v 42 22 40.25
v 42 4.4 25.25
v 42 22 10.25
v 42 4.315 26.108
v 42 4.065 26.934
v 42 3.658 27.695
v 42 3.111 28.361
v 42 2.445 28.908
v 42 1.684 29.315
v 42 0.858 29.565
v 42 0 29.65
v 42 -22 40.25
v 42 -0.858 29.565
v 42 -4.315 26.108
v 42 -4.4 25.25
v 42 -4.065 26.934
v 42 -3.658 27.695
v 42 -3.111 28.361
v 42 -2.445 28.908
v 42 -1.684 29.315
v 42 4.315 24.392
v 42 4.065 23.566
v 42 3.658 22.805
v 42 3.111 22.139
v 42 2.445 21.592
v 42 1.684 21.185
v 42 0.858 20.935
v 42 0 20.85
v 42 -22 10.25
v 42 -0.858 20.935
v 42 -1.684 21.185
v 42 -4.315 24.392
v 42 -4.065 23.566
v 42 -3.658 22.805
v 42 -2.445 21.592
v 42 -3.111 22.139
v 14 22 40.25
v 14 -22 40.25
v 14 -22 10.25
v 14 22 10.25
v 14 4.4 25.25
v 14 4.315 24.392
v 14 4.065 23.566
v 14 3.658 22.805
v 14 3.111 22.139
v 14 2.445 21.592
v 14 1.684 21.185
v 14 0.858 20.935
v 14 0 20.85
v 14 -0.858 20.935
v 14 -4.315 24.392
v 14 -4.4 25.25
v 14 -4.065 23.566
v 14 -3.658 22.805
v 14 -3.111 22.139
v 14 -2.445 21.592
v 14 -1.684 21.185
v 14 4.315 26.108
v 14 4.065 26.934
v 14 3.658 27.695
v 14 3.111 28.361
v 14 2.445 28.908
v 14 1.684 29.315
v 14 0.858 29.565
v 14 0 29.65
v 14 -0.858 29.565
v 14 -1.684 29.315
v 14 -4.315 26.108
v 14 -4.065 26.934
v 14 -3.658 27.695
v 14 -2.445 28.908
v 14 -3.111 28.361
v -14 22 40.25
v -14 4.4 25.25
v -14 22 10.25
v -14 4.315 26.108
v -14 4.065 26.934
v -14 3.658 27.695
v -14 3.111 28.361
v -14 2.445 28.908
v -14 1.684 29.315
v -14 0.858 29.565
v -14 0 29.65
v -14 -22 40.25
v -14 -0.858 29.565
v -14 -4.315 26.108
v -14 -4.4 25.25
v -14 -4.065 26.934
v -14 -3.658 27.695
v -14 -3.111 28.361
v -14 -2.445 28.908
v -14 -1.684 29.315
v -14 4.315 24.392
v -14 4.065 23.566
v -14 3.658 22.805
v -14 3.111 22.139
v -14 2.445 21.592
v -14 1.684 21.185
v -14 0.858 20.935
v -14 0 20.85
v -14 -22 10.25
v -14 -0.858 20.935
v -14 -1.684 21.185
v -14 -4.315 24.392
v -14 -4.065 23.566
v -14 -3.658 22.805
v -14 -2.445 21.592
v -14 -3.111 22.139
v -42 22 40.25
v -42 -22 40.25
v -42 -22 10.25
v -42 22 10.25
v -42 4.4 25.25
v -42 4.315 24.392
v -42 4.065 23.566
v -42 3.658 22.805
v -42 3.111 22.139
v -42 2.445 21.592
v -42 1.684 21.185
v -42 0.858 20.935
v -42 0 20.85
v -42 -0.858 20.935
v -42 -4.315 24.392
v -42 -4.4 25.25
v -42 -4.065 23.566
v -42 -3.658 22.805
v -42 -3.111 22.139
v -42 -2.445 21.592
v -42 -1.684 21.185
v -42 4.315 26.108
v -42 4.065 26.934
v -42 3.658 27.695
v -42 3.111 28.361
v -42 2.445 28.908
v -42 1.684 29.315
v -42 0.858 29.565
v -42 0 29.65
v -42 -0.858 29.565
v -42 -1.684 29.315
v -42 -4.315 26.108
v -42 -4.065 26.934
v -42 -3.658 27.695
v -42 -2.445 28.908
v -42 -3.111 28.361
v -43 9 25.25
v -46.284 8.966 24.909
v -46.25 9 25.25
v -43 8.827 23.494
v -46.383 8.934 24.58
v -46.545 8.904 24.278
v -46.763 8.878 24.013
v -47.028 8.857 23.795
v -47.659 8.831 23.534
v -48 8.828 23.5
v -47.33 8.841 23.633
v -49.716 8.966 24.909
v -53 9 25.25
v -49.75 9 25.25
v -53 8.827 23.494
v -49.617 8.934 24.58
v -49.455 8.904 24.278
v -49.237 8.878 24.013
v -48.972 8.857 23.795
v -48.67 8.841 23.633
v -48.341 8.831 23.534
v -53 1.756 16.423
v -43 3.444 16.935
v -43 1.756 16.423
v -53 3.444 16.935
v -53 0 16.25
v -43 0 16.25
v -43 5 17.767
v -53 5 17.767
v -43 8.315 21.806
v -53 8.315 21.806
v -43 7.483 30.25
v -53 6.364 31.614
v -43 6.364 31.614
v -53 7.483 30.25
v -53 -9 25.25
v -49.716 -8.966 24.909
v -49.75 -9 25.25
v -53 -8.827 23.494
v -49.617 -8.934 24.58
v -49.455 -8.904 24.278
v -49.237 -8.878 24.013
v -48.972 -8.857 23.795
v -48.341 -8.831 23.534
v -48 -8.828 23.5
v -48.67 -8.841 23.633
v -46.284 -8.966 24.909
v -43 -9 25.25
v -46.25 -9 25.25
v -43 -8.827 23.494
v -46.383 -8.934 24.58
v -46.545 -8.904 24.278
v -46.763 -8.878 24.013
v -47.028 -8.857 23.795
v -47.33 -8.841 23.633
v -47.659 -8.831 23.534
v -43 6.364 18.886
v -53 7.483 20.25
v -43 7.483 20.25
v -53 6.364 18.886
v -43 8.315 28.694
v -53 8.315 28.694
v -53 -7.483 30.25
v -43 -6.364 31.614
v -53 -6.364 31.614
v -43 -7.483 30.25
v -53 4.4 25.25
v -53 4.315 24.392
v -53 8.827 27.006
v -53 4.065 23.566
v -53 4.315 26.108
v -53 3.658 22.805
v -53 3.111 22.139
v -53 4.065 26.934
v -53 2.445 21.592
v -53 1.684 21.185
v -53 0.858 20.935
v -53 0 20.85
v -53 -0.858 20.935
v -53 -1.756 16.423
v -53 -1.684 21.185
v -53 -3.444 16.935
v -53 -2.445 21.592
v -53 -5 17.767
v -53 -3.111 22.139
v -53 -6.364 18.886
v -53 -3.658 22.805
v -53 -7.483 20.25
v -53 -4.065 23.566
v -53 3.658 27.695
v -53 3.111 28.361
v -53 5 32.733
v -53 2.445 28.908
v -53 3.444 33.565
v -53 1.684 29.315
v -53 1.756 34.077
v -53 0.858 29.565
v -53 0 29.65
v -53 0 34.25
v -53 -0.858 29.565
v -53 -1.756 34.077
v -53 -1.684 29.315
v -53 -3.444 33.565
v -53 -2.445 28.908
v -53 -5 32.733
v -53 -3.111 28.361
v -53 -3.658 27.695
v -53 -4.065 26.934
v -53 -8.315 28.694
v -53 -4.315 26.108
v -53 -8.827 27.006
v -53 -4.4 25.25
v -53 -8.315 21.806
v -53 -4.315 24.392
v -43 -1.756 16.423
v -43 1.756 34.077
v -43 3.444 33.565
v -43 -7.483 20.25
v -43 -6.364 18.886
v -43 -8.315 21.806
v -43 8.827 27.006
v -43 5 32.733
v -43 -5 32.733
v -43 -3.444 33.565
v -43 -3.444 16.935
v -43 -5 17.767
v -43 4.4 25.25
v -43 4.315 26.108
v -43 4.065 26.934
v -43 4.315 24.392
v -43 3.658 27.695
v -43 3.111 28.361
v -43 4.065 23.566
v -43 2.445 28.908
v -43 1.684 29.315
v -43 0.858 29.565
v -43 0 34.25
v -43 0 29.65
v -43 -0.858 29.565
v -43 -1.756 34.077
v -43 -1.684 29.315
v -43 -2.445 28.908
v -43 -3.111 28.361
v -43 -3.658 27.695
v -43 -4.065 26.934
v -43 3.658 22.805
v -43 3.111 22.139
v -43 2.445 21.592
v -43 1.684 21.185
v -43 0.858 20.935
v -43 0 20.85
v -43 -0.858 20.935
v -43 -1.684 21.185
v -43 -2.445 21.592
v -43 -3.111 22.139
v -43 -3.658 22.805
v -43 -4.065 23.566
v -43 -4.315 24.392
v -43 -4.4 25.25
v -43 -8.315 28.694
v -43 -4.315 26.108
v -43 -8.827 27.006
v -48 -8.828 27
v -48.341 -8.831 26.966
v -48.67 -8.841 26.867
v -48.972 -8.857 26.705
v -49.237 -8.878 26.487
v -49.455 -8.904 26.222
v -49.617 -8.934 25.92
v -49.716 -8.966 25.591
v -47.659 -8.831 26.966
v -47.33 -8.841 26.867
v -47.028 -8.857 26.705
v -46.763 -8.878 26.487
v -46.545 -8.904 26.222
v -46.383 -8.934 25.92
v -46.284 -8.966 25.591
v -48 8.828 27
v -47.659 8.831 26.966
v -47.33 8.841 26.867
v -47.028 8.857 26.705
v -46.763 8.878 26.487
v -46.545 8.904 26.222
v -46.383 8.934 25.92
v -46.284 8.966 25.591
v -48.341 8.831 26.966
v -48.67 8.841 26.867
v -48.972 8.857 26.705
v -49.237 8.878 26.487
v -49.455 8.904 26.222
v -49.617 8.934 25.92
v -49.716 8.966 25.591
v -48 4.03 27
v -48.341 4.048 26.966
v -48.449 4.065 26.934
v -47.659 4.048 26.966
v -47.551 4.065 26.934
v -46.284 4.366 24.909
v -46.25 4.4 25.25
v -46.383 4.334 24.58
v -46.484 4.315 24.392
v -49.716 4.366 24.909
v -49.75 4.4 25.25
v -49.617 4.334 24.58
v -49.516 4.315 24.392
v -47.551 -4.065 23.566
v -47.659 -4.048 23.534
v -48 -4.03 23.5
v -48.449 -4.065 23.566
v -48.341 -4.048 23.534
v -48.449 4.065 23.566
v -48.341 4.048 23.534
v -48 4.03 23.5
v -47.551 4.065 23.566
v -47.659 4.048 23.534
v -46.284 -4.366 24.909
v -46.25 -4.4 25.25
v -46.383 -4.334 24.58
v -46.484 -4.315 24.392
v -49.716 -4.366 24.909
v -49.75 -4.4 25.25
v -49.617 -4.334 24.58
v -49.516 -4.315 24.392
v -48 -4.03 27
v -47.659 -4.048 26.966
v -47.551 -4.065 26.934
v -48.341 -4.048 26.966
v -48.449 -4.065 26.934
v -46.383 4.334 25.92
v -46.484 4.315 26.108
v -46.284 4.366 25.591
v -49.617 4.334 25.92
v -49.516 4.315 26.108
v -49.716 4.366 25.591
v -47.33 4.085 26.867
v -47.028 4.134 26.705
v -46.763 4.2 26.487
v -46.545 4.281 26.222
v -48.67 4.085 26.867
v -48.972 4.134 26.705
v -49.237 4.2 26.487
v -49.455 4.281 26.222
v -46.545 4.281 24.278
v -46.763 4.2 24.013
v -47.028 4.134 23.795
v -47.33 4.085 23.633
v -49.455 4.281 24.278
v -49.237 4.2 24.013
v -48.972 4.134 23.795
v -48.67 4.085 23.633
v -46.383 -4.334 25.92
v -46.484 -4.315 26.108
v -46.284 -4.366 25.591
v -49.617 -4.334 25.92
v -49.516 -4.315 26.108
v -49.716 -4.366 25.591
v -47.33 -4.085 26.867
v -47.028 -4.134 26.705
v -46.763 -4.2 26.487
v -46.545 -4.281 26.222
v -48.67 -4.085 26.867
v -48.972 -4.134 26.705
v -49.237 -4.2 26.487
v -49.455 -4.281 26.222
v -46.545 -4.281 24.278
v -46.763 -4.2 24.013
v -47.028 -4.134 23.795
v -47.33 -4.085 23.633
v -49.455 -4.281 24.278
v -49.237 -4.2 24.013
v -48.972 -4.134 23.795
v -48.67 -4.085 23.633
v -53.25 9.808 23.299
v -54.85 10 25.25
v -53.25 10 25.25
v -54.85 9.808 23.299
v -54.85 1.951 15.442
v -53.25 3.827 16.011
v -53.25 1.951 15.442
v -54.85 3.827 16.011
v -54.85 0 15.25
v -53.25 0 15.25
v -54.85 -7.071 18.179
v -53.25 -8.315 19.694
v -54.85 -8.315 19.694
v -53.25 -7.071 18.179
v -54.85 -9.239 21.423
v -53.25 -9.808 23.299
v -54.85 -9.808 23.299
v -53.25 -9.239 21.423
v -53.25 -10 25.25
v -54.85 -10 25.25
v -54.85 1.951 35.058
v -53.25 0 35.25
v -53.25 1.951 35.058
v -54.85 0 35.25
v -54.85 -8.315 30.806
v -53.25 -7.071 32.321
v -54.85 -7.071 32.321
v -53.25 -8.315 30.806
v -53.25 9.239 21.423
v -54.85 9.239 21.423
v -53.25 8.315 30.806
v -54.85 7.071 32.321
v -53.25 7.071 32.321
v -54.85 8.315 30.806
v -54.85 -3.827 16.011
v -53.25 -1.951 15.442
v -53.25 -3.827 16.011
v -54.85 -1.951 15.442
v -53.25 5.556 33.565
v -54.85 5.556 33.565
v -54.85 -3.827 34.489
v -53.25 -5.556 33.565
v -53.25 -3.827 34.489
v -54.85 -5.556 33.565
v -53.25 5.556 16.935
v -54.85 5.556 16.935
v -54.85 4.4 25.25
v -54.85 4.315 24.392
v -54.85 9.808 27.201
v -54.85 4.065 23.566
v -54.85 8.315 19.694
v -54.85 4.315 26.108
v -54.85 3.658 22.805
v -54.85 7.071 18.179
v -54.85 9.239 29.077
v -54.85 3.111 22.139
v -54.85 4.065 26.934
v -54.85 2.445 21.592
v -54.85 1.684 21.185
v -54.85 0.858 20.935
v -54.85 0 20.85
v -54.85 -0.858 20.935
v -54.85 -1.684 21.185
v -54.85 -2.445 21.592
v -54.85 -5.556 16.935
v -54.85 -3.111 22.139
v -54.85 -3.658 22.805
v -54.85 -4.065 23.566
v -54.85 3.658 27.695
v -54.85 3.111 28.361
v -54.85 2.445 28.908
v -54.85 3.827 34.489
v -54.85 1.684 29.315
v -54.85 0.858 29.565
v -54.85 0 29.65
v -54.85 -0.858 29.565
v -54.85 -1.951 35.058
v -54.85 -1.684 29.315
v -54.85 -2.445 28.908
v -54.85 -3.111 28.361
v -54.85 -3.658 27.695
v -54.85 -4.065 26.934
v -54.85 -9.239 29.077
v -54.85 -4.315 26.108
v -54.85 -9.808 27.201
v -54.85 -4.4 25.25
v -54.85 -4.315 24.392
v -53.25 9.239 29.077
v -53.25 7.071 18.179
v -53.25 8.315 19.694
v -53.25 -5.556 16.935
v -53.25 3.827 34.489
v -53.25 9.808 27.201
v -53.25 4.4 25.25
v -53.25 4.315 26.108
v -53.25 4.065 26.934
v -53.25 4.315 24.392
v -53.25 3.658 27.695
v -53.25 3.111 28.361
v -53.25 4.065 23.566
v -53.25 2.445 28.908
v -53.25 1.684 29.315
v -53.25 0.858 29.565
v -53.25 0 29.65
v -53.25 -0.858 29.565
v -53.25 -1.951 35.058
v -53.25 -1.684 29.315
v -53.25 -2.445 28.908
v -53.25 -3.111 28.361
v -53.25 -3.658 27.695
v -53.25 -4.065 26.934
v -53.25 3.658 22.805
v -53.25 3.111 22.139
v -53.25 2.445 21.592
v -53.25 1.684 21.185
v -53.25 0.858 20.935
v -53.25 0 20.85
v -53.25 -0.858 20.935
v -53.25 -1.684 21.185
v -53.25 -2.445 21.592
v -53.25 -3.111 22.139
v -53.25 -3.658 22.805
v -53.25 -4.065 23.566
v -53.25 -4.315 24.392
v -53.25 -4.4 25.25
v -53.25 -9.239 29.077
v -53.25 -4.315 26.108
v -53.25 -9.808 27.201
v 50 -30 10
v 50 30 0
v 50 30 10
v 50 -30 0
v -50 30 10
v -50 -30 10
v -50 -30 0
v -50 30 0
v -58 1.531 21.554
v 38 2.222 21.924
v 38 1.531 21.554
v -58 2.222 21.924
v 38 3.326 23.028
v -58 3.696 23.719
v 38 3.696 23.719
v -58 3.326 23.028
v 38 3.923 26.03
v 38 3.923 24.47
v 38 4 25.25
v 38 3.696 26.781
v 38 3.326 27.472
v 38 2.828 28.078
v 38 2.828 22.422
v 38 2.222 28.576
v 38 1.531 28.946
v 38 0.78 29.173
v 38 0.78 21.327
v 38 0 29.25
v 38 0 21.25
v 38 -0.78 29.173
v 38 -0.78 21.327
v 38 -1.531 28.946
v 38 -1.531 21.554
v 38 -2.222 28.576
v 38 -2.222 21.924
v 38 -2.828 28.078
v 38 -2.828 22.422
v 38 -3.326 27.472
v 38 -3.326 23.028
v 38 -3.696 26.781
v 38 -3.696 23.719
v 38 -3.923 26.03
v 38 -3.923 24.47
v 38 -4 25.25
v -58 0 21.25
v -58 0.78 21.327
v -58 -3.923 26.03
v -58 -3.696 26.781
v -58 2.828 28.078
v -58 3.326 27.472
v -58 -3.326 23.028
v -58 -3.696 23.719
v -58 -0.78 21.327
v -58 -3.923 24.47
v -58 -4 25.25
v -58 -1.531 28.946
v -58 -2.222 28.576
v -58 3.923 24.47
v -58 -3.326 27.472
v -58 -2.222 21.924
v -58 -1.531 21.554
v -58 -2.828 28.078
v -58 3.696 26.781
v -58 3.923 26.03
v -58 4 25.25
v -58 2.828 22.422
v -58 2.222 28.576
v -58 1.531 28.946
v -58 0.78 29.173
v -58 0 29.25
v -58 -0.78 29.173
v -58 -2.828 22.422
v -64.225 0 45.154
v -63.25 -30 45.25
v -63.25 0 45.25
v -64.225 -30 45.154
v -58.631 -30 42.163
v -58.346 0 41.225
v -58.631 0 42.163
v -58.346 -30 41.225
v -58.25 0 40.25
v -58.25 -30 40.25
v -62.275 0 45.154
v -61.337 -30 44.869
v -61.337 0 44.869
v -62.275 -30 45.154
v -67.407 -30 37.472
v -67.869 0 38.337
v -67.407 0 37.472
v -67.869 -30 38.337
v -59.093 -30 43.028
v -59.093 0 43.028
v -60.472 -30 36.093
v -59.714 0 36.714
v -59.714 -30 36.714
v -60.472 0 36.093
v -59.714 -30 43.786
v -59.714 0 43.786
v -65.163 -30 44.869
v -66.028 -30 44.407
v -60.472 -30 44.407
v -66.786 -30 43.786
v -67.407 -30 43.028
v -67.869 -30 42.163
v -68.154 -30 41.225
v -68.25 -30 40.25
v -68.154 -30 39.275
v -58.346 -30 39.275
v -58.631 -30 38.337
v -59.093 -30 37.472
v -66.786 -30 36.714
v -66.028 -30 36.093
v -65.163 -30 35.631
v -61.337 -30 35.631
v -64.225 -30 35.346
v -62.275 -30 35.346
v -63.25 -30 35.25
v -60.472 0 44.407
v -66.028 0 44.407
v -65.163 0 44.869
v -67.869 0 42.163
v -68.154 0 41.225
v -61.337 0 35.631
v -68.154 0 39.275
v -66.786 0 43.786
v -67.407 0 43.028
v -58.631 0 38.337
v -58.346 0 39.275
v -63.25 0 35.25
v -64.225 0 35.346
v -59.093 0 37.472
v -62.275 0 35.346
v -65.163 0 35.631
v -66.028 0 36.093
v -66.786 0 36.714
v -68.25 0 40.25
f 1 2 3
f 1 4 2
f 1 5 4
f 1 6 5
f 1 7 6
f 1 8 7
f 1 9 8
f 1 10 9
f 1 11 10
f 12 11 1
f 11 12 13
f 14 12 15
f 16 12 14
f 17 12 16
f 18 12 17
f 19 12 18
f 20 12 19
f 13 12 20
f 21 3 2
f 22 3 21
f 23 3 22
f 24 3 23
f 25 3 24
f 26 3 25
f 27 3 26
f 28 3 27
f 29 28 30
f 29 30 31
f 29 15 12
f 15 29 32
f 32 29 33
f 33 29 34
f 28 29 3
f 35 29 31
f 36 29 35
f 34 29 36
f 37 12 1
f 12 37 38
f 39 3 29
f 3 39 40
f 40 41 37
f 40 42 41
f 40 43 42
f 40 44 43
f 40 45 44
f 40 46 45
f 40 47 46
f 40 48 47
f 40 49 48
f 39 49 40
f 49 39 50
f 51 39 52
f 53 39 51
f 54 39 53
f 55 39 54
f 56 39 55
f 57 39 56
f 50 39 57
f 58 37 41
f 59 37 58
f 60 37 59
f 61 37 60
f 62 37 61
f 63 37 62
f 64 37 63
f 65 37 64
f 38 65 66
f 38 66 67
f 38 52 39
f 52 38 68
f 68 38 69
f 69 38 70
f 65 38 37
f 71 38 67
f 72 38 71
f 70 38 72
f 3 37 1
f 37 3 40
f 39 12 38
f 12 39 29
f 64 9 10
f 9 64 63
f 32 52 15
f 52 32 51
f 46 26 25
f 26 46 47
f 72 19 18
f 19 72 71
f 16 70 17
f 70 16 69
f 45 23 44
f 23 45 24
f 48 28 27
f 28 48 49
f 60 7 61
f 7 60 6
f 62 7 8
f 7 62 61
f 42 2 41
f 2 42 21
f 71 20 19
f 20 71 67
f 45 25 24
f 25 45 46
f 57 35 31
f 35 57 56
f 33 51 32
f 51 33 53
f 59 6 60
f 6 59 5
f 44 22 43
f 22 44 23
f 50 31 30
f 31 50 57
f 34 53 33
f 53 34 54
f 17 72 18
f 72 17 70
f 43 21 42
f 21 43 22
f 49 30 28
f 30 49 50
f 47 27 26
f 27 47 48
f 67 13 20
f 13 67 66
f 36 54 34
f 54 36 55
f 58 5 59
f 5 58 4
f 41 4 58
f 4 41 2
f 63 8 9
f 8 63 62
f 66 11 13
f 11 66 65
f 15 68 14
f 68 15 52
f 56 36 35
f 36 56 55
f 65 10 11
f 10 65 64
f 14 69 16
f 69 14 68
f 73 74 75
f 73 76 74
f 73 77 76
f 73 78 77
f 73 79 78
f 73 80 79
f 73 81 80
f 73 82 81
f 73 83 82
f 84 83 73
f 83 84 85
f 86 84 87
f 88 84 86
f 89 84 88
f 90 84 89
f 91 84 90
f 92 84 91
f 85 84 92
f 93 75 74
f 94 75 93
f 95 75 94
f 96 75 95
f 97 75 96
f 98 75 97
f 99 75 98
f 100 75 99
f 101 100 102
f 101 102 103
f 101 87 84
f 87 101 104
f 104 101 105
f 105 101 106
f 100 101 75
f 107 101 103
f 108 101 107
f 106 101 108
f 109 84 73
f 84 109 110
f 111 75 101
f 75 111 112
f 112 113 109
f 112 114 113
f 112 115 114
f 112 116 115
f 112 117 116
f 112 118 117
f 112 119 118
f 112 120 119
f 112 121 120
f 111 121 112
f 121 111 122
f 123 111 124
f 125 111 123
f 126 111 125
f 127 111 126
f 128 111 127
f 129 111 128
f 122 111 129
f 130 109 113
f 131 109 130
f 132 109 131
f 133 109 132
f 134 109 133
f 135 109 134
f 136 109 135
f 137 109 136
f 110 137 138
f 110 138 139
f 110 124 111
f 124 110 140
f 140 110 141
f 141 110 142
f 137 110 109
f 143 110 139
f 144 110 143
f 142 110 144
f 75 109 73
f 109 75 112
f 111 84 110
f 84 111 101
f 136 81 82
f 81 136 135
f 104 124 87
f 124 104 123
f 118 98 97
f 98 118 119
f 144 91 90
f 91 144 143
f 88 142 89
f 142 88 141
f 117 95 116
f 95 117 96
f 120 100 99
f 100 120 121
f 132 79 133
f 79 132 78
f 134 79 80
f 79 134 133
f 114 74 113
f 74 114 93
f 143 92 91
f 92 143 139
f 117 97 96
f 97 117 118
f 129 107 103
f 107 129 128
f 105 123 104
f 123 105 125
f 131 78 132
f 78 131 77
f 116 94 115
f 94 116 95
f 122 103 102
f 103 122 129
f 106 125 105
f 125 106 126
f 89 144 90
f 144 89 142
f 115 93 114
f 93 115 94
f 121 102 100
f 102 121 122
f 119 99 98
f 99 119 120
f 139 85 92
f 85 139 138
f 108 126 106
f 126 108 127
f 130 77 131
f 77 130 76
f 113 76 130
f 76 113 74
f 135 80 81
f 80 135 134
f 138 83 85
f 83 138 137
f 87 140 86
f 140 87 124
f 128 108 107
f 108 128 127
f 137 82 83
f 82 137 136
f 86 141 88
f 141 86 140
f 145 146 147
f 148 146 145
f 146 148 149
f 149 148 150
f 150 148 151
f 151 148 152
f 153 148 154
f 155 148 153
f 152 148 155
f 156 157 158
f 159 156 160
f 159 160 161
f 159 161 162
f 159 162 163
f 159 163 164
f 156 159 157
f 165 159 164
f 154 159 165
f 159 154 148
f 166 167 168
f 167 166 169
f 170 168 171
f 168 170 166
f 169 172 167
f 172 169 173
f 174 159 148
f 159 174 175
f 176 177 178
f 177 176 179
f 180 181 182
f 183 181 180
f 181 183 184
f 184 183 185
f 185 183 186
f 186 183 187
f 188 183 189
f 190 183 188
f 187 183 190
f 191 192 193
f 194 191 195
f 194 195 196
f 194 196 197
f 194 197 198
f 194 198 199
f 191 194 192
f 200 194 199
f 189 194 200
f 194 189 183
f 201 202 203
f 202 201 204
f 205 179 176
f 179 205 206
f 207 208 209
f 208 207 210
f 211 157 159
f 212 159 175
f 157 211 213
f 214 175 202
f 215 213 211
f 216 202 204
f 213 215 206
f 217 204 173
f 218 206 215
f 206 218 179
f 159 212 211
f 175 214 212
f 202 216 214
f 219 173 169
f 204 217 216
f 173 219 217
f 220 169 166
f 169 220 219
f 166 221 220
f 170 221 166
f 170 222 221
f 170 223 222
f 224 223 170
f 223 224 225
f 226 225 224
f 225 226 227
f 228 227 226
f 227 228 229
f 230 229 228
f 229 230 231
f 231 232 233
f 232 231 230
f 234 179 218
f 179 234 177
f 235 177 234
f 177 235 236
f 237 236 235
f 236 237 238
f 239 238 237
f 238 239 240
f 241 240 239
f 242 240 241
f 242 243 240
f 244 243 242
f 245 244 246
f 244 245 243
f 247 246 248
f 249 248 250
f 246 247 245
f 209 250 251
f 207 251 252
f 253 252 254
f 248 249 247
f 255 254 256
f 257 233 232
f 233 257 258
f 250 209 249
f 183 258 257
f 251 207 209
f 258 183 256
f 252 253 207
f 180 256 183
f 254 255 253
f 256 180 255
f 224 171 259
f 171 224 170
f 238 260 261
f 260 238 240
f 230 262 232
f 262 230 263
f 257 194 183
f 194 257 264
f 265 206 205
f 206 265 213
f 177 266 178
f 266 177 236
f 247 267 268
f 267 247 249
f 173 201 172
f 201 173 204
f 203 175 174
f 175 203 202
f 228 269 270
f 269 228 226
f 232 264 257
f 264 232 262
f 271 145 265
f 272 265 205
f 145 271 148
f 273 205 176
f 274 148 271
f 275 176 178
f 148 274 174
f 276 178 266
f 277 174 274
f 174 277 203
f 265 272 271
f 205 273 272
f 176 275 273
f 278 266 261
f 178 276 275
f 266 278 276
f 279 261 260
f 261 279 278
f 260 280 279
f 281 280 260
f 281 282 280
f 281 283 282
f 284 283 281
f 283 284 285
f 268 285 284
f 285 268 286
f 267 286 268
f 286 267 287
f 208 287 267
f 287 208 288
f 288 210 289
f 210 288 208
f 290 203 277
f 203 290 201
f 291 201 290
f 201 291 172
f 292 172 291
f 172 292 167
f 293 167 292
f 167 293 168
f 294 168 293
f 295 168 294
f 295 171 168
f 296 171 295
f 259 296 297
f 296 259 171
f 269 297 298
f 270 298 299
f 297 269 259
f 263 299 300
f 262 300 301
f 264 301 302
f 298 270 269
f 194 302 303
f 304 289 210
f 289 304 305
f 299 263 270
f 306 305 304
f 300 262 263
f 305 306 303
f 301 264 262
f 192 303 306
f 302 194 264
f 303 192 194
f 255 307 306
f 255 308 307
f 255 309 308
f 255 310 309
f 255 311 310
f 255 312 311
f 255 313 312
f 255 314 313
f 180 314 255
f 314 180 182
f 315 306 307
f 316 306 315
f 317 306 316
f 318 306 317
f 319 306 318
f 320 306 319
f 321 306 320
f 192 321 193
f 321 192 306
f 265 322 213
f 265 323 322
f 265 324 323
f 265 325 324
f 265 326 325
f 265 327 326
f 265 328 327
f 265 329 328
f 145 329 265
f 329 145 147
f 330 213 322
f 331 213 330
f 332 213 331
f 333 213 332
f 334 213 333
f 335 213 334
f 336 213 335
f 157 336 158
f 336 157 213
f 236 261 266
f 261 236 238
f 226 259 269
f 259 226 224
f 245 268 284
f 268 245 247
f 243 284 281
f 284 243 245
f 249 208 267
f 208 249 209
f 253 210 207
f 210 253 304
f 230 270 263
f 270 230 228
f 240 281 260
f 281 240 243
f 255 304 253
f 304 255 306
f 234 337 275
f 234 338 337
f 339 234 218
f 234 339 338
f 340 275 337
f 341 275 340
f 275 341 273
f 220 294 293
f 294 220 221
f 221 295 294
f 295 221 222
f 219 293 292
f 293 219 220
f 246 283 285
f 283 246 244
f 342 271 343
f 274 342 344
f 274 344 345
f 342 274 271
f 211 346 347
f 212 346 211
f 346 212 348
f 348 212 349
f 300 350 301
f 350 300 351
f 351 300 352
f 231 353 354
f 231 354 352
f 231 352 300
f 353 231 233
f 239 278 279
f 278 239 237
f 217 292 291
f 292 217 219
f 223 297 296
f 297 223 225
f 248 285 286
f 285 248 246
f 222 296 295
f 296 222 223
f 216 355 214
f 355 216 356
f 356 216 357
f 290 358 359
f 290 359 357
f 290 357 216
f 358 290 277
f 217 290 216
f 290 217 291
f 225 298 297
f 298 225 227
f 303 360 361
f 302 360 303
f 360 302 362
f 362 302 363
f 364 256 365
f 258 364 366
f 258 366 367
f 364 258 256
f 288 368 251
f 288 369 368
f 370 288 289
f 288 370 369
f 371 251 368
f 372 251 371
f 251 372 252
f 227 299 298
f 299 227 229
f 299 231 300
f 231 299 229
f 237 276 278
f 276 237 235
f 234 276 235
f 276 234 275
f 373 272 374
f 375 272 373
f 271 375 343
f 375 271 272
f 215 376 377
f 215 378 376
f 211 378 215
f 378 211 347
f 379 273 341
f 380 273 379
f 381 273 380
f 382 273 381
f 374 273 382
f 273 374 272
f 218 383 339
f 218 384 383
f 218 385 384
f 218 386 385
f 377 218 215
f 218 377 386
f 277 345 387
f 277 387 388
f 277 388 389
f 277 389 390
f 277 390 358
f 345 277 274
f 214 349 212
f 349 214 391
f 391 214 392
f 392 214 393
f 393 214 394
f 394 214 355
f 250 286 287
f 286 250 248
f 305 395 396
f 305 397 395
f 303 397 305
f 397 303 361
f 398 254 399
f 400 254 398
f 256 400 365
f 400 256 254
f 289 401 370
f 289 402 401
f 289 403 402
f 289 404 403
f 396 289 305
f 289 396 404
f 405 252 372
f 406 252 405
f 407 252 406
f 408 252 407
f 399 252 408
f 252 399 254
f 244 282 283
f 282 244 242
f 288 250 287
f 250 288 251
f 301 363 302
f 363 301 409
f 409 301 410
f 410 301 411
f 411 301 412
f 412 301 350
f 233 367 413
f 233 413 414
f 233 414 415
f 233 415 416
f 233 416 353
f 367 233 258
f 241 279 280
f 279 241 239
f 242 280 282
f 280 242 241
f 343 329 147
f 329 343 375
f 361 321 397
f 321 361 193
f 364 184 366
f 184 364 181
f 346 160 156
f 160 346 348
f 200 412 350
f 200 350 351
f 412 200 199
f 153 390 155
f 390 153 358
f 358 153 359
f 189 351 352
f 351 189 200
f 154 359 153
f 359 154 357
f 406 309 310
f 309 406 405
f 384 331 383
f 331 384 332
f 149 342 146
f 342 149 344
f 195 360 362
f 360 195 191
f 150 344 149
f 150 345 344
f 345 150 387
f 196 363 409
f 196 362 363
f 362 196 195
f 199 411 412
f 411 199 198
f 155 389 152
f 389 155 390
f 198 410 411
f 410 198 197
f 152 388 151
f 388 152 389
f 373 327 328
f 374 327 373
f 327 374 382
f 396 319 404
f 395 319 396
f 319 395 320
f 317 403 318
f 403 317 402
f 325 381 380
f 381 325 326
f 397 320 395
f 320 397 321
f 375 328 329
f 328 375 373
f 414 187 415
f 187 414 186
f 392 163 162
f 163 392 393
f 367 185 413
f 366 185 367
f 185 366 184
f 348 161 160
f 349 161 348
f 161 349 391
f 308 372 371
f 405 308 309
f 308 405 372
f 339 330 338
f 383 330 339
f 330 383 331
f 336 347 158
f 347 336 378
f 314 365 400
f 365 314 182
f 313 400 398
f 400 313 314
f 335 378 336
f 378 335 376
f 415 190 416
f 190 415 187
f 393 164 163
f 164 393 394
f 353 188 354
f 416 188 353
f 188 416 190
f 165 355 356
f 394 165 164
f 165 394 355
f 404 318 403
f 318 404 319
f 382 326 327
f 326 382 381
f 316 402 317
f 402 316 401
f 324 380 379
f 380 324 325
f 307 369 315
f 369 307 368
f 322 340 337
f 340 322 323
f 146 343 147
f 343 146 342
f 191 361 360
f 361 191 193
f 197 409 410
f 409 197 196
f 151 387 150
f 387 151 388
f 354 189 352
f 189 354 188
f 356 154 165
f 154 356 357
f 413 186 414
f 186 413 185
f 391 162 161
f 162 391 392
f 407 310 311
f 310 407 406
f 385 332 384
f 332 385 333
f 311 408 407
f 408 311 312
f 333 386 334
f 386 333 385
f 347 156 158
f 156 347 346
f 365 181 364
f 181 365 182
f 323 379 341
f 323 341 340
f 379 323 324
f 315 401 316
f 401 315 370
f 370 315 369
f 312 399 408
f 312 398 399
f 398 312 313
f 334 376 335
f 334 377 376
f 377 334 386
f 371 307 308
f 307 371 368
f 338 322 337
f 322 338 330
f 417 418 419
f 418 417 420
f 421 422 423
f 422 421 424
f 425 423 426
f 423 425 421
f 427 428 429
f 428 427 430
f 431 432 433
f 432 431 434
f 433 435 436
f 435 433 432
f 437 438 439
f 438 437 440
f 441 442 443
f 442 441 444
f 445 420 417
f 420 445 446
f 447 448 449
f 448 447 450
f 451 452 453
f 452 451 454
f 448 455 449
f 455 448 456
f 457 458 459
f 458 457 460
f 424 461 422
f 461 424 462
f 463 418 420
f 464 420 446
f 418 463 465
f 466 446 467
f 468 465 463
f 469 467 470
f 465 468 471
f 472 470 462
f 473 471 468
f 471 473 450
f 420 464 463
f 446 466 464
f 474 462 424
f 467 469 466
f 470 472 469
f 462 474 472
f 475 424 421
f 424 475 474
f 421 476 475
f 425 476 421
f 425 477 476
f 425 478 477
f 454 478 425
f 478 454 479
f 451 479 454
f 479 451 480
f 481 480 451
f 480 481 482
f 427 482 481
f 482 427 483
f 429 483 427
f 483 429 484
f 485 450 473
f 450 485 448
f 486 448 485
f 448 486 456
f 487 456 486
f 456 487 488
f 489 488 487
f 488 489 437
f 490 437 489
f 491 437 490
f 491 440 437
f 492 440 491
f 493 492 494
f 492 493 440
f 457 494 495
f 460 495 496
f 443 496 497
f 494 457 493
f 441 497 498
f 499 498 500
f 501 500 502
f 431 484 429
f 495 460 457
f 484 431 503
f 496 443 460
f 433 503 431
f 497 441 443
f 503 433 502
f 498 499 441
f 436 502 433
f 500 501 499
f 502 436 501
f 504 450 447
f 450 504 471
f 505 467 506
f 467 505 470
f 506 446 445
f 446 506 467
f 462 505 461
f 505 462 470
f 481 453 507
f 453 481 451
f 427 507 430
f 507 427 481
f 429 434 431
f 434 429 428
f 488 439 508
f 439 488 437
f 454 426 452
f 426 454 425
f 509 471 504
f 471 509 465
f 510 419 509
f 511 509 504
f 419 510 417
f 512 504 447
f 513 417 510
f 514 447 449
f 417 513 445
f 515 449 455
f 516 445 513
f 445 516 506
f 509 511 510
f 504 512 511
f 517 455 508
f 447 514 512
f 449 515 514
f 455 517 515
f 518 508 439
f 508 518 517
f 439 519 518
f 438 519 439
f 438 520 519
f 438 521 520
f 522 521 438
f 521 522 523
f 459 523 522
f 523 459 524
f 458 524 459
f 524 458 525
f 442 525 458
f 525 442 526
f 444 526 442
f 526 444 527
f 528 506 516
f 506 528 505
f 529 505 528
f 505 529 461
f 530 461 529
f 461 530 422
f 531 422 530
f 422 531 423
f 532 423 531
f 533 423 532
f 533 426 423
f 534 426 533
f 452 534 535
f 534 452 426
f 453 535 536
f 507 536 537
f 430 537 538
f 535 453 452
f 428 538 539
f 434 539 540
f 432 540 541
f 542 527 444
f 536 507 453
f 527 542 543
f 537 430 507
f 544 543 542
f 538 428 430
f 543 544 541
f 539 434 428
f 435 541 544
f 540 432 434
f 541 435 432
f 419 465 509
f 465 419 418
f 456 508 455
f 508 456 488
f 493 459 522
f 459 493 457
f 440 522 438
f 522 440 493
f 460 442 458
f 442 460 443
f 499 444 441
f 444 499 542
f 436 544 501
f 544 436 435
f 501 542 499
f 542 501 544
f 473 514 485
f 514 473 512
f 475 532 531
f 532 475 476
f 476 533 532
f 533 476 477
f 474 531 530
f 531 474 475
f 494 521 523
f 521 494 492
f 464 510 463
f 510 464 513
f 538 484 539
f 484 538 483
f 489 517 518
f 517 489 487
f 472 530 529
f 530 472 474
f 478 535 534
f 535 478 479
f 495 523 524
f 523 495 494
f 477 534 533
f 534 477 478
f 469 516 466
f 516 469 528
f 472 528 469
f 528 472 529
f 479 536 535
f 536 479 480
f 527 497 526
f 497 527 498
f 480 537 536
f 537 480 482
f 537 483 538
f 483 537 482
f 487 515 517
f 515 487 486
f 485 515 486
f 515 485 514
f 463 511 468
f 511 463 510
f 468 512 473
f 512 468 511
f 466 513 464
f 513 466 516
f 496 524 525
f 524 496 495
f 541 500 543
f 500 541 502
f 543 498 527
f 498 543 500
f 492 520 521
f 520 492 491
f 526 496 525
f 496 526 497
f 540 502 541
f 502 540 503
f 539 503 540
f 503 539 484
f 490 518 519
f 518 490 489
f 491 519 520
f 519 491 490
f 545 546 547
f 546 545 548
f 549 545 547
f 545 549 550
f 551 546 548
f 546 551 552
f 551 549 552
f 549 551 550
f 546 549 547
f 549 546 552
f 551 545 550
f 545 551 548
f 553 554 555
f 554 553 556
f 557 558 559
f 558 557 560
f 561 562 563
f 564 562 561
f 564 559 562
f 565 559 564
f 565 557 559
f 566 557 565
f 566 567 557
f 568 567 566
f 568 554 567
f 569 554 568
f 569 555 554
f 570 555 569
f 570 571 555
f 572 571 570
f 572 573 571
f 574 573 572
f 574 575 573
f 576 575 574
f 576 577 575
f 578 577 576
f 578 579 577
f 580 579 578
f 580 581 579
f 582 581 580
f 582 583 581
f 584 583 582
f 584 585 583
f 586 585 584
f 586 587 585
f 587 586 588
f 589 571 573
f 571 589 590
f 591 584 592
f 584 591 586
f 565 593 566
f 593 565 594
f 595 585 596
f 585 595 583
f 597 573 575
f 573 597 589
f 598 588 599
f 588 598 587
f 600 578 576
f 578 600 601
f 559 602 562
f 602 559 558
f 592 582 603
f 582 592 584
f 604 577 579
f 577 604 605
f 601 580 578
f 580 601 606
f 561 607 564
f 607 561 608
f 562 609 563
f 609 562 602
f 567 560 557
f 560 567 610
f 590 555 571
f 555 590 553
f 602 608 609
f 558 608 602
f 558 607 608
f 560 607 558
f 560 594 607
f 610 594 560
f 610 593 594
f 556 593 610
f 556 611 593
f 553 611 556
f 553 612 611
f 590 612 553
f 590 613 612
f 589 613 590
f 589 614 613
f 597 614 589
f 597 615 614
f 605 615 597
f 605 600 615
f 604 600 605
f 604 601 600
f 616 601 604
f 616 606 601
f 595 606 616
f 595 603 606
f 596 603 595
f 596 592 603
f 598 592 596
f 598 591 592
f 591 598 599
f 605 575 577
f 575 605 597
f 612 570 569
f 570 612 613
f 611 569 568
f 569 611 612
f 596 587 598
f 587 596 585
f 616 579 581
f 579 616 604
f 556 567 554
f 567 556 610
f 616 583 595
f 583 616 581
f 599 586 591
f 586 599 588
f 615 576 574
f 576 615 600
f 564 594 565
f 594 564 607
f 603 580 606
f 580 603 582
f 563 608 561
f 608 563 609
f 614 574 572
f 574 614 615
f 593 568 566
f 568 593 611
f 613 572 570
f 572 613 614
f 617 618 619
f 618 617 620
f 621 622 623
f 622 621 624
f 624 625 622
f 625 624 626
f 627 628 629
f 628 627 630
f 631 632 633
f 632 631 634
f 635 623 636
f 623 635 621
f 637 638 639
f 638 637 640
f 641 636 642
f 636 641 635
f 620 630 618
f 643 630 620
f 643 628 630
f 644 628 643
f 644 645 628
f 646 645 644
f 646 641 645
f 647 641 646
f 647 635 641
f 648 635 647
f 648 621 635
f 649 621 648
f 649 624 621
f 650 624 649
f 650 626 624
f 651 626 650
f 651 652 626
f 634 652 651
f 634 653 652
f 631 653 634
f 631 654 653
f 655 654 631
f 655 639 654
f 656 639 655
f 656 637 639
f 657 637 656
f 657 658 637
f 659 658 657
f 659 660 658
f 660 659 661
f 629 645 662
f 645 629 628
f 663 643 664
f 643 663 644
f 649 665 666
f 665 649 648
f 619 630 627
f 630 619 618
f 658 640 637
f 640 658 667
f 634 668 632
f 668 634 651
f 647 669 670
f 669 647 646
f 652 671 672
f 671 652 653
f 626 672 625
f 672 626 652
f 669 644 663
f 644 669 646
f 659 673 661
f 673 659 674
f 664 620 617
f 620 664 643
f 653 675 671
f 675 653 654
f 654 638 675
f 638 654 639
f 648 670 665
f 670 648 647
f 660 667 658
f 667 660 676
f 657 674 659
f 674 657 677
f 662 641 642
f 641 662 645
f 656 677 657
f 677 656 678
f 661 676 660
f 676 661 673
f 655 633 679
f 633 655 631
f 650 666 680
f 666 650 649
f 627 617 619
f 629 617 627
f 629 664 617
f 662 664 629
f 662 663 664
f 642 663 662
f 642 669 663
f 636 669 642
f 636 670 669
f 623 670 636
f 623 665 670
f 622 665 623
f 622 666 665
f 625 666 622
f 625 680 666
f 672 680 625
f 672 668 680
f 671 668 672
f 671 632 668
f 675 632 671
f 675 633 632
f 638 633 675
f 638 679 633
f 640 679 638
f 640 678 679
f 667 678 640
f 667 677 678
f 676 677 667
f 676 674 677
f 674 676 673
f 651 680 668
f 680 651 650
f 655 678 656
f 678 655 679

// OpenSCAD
$fn = 32;

// ------------------------------------------------------------------------
// Machine vise: screw d8, jaws 28 x 30 mm
// Every part is its own module, assembly() places every instance.
// ------------------------------------------------------------------------

// --- part 1 ---
module vise_bed() {
  difference() {
    translate([-50, -30, 0]) cube([100, 60, 10]);
  }
}

// --- part 2 ---
module vise_jaw() {
  difference() {
    translate([-14, -22, 0]) cube([28, 44, 30]);
    translate([0, 0, 15]) rotate([0, 90, 0]) cylinder(h = 30, d = 8.8, center = true);
  }
}

// --- part 3 ---
module vise_screw() {
  translate([0, 0, -48]) cylinder(h = 96, d = 8);
}

// --- part 4 ---
module screw_collar() {
  difference() {
    cylinder(h = 10, d = 18);
    translate([0, 0, -1]) cylinder(h = 12, d = 8.8);
    translate([0, 0, 5]) rotate([90, 0, 0]) cylinder(h = 20, d = 3.5, center = true);
  }
}

// --- part 5 ---
module screw_washer() {
  difference() {
      translate([0, 0, 0]) cylinder(h = 1.6, d = 20);
      translate([0, 0, -1]) cylinder(h = 3.6, d = 8.8);
    }
}

// --- part 6 ---
module vise_handle() {
  cylinder(h = 30, d = 10);
}

// --- assembly ---
module assembly() {
  color([0.80, 0.24, 0.20]) translate([0, 0, 0]) rotate([0, 0, 0]) vise_bed();
  color([0.20, 0.45, 0.75]) translate([28, 0, 10.25]) rotate([0, 0, 0]) vise_jaw();
  color([0.25, 0.62, 0.32]) translate([-28, 0, 10.25]) rotate([0, 0, 0]) vise_jaw();
  color([0.92, 0.70, 0.18]) translate([-10, 0, 25.25]) rotate([0, 90, 0]) vise_screw();
  color([0.58, 0.35, 0.70]) translate([-53, 0, 25.25]) rotate([0, 90, 0]) screw_collar();
  color([0.16, 0.66, 0.66]) translate([-54.85, 0, 25.25]) rotate([0, 90, 0]) screw_washer();
  color([0.85, 0.48, 0.18]) translate([-63.25, 0, 40.25]) rotate([90, 0, 0]) vise_handle();
}

assembly();
